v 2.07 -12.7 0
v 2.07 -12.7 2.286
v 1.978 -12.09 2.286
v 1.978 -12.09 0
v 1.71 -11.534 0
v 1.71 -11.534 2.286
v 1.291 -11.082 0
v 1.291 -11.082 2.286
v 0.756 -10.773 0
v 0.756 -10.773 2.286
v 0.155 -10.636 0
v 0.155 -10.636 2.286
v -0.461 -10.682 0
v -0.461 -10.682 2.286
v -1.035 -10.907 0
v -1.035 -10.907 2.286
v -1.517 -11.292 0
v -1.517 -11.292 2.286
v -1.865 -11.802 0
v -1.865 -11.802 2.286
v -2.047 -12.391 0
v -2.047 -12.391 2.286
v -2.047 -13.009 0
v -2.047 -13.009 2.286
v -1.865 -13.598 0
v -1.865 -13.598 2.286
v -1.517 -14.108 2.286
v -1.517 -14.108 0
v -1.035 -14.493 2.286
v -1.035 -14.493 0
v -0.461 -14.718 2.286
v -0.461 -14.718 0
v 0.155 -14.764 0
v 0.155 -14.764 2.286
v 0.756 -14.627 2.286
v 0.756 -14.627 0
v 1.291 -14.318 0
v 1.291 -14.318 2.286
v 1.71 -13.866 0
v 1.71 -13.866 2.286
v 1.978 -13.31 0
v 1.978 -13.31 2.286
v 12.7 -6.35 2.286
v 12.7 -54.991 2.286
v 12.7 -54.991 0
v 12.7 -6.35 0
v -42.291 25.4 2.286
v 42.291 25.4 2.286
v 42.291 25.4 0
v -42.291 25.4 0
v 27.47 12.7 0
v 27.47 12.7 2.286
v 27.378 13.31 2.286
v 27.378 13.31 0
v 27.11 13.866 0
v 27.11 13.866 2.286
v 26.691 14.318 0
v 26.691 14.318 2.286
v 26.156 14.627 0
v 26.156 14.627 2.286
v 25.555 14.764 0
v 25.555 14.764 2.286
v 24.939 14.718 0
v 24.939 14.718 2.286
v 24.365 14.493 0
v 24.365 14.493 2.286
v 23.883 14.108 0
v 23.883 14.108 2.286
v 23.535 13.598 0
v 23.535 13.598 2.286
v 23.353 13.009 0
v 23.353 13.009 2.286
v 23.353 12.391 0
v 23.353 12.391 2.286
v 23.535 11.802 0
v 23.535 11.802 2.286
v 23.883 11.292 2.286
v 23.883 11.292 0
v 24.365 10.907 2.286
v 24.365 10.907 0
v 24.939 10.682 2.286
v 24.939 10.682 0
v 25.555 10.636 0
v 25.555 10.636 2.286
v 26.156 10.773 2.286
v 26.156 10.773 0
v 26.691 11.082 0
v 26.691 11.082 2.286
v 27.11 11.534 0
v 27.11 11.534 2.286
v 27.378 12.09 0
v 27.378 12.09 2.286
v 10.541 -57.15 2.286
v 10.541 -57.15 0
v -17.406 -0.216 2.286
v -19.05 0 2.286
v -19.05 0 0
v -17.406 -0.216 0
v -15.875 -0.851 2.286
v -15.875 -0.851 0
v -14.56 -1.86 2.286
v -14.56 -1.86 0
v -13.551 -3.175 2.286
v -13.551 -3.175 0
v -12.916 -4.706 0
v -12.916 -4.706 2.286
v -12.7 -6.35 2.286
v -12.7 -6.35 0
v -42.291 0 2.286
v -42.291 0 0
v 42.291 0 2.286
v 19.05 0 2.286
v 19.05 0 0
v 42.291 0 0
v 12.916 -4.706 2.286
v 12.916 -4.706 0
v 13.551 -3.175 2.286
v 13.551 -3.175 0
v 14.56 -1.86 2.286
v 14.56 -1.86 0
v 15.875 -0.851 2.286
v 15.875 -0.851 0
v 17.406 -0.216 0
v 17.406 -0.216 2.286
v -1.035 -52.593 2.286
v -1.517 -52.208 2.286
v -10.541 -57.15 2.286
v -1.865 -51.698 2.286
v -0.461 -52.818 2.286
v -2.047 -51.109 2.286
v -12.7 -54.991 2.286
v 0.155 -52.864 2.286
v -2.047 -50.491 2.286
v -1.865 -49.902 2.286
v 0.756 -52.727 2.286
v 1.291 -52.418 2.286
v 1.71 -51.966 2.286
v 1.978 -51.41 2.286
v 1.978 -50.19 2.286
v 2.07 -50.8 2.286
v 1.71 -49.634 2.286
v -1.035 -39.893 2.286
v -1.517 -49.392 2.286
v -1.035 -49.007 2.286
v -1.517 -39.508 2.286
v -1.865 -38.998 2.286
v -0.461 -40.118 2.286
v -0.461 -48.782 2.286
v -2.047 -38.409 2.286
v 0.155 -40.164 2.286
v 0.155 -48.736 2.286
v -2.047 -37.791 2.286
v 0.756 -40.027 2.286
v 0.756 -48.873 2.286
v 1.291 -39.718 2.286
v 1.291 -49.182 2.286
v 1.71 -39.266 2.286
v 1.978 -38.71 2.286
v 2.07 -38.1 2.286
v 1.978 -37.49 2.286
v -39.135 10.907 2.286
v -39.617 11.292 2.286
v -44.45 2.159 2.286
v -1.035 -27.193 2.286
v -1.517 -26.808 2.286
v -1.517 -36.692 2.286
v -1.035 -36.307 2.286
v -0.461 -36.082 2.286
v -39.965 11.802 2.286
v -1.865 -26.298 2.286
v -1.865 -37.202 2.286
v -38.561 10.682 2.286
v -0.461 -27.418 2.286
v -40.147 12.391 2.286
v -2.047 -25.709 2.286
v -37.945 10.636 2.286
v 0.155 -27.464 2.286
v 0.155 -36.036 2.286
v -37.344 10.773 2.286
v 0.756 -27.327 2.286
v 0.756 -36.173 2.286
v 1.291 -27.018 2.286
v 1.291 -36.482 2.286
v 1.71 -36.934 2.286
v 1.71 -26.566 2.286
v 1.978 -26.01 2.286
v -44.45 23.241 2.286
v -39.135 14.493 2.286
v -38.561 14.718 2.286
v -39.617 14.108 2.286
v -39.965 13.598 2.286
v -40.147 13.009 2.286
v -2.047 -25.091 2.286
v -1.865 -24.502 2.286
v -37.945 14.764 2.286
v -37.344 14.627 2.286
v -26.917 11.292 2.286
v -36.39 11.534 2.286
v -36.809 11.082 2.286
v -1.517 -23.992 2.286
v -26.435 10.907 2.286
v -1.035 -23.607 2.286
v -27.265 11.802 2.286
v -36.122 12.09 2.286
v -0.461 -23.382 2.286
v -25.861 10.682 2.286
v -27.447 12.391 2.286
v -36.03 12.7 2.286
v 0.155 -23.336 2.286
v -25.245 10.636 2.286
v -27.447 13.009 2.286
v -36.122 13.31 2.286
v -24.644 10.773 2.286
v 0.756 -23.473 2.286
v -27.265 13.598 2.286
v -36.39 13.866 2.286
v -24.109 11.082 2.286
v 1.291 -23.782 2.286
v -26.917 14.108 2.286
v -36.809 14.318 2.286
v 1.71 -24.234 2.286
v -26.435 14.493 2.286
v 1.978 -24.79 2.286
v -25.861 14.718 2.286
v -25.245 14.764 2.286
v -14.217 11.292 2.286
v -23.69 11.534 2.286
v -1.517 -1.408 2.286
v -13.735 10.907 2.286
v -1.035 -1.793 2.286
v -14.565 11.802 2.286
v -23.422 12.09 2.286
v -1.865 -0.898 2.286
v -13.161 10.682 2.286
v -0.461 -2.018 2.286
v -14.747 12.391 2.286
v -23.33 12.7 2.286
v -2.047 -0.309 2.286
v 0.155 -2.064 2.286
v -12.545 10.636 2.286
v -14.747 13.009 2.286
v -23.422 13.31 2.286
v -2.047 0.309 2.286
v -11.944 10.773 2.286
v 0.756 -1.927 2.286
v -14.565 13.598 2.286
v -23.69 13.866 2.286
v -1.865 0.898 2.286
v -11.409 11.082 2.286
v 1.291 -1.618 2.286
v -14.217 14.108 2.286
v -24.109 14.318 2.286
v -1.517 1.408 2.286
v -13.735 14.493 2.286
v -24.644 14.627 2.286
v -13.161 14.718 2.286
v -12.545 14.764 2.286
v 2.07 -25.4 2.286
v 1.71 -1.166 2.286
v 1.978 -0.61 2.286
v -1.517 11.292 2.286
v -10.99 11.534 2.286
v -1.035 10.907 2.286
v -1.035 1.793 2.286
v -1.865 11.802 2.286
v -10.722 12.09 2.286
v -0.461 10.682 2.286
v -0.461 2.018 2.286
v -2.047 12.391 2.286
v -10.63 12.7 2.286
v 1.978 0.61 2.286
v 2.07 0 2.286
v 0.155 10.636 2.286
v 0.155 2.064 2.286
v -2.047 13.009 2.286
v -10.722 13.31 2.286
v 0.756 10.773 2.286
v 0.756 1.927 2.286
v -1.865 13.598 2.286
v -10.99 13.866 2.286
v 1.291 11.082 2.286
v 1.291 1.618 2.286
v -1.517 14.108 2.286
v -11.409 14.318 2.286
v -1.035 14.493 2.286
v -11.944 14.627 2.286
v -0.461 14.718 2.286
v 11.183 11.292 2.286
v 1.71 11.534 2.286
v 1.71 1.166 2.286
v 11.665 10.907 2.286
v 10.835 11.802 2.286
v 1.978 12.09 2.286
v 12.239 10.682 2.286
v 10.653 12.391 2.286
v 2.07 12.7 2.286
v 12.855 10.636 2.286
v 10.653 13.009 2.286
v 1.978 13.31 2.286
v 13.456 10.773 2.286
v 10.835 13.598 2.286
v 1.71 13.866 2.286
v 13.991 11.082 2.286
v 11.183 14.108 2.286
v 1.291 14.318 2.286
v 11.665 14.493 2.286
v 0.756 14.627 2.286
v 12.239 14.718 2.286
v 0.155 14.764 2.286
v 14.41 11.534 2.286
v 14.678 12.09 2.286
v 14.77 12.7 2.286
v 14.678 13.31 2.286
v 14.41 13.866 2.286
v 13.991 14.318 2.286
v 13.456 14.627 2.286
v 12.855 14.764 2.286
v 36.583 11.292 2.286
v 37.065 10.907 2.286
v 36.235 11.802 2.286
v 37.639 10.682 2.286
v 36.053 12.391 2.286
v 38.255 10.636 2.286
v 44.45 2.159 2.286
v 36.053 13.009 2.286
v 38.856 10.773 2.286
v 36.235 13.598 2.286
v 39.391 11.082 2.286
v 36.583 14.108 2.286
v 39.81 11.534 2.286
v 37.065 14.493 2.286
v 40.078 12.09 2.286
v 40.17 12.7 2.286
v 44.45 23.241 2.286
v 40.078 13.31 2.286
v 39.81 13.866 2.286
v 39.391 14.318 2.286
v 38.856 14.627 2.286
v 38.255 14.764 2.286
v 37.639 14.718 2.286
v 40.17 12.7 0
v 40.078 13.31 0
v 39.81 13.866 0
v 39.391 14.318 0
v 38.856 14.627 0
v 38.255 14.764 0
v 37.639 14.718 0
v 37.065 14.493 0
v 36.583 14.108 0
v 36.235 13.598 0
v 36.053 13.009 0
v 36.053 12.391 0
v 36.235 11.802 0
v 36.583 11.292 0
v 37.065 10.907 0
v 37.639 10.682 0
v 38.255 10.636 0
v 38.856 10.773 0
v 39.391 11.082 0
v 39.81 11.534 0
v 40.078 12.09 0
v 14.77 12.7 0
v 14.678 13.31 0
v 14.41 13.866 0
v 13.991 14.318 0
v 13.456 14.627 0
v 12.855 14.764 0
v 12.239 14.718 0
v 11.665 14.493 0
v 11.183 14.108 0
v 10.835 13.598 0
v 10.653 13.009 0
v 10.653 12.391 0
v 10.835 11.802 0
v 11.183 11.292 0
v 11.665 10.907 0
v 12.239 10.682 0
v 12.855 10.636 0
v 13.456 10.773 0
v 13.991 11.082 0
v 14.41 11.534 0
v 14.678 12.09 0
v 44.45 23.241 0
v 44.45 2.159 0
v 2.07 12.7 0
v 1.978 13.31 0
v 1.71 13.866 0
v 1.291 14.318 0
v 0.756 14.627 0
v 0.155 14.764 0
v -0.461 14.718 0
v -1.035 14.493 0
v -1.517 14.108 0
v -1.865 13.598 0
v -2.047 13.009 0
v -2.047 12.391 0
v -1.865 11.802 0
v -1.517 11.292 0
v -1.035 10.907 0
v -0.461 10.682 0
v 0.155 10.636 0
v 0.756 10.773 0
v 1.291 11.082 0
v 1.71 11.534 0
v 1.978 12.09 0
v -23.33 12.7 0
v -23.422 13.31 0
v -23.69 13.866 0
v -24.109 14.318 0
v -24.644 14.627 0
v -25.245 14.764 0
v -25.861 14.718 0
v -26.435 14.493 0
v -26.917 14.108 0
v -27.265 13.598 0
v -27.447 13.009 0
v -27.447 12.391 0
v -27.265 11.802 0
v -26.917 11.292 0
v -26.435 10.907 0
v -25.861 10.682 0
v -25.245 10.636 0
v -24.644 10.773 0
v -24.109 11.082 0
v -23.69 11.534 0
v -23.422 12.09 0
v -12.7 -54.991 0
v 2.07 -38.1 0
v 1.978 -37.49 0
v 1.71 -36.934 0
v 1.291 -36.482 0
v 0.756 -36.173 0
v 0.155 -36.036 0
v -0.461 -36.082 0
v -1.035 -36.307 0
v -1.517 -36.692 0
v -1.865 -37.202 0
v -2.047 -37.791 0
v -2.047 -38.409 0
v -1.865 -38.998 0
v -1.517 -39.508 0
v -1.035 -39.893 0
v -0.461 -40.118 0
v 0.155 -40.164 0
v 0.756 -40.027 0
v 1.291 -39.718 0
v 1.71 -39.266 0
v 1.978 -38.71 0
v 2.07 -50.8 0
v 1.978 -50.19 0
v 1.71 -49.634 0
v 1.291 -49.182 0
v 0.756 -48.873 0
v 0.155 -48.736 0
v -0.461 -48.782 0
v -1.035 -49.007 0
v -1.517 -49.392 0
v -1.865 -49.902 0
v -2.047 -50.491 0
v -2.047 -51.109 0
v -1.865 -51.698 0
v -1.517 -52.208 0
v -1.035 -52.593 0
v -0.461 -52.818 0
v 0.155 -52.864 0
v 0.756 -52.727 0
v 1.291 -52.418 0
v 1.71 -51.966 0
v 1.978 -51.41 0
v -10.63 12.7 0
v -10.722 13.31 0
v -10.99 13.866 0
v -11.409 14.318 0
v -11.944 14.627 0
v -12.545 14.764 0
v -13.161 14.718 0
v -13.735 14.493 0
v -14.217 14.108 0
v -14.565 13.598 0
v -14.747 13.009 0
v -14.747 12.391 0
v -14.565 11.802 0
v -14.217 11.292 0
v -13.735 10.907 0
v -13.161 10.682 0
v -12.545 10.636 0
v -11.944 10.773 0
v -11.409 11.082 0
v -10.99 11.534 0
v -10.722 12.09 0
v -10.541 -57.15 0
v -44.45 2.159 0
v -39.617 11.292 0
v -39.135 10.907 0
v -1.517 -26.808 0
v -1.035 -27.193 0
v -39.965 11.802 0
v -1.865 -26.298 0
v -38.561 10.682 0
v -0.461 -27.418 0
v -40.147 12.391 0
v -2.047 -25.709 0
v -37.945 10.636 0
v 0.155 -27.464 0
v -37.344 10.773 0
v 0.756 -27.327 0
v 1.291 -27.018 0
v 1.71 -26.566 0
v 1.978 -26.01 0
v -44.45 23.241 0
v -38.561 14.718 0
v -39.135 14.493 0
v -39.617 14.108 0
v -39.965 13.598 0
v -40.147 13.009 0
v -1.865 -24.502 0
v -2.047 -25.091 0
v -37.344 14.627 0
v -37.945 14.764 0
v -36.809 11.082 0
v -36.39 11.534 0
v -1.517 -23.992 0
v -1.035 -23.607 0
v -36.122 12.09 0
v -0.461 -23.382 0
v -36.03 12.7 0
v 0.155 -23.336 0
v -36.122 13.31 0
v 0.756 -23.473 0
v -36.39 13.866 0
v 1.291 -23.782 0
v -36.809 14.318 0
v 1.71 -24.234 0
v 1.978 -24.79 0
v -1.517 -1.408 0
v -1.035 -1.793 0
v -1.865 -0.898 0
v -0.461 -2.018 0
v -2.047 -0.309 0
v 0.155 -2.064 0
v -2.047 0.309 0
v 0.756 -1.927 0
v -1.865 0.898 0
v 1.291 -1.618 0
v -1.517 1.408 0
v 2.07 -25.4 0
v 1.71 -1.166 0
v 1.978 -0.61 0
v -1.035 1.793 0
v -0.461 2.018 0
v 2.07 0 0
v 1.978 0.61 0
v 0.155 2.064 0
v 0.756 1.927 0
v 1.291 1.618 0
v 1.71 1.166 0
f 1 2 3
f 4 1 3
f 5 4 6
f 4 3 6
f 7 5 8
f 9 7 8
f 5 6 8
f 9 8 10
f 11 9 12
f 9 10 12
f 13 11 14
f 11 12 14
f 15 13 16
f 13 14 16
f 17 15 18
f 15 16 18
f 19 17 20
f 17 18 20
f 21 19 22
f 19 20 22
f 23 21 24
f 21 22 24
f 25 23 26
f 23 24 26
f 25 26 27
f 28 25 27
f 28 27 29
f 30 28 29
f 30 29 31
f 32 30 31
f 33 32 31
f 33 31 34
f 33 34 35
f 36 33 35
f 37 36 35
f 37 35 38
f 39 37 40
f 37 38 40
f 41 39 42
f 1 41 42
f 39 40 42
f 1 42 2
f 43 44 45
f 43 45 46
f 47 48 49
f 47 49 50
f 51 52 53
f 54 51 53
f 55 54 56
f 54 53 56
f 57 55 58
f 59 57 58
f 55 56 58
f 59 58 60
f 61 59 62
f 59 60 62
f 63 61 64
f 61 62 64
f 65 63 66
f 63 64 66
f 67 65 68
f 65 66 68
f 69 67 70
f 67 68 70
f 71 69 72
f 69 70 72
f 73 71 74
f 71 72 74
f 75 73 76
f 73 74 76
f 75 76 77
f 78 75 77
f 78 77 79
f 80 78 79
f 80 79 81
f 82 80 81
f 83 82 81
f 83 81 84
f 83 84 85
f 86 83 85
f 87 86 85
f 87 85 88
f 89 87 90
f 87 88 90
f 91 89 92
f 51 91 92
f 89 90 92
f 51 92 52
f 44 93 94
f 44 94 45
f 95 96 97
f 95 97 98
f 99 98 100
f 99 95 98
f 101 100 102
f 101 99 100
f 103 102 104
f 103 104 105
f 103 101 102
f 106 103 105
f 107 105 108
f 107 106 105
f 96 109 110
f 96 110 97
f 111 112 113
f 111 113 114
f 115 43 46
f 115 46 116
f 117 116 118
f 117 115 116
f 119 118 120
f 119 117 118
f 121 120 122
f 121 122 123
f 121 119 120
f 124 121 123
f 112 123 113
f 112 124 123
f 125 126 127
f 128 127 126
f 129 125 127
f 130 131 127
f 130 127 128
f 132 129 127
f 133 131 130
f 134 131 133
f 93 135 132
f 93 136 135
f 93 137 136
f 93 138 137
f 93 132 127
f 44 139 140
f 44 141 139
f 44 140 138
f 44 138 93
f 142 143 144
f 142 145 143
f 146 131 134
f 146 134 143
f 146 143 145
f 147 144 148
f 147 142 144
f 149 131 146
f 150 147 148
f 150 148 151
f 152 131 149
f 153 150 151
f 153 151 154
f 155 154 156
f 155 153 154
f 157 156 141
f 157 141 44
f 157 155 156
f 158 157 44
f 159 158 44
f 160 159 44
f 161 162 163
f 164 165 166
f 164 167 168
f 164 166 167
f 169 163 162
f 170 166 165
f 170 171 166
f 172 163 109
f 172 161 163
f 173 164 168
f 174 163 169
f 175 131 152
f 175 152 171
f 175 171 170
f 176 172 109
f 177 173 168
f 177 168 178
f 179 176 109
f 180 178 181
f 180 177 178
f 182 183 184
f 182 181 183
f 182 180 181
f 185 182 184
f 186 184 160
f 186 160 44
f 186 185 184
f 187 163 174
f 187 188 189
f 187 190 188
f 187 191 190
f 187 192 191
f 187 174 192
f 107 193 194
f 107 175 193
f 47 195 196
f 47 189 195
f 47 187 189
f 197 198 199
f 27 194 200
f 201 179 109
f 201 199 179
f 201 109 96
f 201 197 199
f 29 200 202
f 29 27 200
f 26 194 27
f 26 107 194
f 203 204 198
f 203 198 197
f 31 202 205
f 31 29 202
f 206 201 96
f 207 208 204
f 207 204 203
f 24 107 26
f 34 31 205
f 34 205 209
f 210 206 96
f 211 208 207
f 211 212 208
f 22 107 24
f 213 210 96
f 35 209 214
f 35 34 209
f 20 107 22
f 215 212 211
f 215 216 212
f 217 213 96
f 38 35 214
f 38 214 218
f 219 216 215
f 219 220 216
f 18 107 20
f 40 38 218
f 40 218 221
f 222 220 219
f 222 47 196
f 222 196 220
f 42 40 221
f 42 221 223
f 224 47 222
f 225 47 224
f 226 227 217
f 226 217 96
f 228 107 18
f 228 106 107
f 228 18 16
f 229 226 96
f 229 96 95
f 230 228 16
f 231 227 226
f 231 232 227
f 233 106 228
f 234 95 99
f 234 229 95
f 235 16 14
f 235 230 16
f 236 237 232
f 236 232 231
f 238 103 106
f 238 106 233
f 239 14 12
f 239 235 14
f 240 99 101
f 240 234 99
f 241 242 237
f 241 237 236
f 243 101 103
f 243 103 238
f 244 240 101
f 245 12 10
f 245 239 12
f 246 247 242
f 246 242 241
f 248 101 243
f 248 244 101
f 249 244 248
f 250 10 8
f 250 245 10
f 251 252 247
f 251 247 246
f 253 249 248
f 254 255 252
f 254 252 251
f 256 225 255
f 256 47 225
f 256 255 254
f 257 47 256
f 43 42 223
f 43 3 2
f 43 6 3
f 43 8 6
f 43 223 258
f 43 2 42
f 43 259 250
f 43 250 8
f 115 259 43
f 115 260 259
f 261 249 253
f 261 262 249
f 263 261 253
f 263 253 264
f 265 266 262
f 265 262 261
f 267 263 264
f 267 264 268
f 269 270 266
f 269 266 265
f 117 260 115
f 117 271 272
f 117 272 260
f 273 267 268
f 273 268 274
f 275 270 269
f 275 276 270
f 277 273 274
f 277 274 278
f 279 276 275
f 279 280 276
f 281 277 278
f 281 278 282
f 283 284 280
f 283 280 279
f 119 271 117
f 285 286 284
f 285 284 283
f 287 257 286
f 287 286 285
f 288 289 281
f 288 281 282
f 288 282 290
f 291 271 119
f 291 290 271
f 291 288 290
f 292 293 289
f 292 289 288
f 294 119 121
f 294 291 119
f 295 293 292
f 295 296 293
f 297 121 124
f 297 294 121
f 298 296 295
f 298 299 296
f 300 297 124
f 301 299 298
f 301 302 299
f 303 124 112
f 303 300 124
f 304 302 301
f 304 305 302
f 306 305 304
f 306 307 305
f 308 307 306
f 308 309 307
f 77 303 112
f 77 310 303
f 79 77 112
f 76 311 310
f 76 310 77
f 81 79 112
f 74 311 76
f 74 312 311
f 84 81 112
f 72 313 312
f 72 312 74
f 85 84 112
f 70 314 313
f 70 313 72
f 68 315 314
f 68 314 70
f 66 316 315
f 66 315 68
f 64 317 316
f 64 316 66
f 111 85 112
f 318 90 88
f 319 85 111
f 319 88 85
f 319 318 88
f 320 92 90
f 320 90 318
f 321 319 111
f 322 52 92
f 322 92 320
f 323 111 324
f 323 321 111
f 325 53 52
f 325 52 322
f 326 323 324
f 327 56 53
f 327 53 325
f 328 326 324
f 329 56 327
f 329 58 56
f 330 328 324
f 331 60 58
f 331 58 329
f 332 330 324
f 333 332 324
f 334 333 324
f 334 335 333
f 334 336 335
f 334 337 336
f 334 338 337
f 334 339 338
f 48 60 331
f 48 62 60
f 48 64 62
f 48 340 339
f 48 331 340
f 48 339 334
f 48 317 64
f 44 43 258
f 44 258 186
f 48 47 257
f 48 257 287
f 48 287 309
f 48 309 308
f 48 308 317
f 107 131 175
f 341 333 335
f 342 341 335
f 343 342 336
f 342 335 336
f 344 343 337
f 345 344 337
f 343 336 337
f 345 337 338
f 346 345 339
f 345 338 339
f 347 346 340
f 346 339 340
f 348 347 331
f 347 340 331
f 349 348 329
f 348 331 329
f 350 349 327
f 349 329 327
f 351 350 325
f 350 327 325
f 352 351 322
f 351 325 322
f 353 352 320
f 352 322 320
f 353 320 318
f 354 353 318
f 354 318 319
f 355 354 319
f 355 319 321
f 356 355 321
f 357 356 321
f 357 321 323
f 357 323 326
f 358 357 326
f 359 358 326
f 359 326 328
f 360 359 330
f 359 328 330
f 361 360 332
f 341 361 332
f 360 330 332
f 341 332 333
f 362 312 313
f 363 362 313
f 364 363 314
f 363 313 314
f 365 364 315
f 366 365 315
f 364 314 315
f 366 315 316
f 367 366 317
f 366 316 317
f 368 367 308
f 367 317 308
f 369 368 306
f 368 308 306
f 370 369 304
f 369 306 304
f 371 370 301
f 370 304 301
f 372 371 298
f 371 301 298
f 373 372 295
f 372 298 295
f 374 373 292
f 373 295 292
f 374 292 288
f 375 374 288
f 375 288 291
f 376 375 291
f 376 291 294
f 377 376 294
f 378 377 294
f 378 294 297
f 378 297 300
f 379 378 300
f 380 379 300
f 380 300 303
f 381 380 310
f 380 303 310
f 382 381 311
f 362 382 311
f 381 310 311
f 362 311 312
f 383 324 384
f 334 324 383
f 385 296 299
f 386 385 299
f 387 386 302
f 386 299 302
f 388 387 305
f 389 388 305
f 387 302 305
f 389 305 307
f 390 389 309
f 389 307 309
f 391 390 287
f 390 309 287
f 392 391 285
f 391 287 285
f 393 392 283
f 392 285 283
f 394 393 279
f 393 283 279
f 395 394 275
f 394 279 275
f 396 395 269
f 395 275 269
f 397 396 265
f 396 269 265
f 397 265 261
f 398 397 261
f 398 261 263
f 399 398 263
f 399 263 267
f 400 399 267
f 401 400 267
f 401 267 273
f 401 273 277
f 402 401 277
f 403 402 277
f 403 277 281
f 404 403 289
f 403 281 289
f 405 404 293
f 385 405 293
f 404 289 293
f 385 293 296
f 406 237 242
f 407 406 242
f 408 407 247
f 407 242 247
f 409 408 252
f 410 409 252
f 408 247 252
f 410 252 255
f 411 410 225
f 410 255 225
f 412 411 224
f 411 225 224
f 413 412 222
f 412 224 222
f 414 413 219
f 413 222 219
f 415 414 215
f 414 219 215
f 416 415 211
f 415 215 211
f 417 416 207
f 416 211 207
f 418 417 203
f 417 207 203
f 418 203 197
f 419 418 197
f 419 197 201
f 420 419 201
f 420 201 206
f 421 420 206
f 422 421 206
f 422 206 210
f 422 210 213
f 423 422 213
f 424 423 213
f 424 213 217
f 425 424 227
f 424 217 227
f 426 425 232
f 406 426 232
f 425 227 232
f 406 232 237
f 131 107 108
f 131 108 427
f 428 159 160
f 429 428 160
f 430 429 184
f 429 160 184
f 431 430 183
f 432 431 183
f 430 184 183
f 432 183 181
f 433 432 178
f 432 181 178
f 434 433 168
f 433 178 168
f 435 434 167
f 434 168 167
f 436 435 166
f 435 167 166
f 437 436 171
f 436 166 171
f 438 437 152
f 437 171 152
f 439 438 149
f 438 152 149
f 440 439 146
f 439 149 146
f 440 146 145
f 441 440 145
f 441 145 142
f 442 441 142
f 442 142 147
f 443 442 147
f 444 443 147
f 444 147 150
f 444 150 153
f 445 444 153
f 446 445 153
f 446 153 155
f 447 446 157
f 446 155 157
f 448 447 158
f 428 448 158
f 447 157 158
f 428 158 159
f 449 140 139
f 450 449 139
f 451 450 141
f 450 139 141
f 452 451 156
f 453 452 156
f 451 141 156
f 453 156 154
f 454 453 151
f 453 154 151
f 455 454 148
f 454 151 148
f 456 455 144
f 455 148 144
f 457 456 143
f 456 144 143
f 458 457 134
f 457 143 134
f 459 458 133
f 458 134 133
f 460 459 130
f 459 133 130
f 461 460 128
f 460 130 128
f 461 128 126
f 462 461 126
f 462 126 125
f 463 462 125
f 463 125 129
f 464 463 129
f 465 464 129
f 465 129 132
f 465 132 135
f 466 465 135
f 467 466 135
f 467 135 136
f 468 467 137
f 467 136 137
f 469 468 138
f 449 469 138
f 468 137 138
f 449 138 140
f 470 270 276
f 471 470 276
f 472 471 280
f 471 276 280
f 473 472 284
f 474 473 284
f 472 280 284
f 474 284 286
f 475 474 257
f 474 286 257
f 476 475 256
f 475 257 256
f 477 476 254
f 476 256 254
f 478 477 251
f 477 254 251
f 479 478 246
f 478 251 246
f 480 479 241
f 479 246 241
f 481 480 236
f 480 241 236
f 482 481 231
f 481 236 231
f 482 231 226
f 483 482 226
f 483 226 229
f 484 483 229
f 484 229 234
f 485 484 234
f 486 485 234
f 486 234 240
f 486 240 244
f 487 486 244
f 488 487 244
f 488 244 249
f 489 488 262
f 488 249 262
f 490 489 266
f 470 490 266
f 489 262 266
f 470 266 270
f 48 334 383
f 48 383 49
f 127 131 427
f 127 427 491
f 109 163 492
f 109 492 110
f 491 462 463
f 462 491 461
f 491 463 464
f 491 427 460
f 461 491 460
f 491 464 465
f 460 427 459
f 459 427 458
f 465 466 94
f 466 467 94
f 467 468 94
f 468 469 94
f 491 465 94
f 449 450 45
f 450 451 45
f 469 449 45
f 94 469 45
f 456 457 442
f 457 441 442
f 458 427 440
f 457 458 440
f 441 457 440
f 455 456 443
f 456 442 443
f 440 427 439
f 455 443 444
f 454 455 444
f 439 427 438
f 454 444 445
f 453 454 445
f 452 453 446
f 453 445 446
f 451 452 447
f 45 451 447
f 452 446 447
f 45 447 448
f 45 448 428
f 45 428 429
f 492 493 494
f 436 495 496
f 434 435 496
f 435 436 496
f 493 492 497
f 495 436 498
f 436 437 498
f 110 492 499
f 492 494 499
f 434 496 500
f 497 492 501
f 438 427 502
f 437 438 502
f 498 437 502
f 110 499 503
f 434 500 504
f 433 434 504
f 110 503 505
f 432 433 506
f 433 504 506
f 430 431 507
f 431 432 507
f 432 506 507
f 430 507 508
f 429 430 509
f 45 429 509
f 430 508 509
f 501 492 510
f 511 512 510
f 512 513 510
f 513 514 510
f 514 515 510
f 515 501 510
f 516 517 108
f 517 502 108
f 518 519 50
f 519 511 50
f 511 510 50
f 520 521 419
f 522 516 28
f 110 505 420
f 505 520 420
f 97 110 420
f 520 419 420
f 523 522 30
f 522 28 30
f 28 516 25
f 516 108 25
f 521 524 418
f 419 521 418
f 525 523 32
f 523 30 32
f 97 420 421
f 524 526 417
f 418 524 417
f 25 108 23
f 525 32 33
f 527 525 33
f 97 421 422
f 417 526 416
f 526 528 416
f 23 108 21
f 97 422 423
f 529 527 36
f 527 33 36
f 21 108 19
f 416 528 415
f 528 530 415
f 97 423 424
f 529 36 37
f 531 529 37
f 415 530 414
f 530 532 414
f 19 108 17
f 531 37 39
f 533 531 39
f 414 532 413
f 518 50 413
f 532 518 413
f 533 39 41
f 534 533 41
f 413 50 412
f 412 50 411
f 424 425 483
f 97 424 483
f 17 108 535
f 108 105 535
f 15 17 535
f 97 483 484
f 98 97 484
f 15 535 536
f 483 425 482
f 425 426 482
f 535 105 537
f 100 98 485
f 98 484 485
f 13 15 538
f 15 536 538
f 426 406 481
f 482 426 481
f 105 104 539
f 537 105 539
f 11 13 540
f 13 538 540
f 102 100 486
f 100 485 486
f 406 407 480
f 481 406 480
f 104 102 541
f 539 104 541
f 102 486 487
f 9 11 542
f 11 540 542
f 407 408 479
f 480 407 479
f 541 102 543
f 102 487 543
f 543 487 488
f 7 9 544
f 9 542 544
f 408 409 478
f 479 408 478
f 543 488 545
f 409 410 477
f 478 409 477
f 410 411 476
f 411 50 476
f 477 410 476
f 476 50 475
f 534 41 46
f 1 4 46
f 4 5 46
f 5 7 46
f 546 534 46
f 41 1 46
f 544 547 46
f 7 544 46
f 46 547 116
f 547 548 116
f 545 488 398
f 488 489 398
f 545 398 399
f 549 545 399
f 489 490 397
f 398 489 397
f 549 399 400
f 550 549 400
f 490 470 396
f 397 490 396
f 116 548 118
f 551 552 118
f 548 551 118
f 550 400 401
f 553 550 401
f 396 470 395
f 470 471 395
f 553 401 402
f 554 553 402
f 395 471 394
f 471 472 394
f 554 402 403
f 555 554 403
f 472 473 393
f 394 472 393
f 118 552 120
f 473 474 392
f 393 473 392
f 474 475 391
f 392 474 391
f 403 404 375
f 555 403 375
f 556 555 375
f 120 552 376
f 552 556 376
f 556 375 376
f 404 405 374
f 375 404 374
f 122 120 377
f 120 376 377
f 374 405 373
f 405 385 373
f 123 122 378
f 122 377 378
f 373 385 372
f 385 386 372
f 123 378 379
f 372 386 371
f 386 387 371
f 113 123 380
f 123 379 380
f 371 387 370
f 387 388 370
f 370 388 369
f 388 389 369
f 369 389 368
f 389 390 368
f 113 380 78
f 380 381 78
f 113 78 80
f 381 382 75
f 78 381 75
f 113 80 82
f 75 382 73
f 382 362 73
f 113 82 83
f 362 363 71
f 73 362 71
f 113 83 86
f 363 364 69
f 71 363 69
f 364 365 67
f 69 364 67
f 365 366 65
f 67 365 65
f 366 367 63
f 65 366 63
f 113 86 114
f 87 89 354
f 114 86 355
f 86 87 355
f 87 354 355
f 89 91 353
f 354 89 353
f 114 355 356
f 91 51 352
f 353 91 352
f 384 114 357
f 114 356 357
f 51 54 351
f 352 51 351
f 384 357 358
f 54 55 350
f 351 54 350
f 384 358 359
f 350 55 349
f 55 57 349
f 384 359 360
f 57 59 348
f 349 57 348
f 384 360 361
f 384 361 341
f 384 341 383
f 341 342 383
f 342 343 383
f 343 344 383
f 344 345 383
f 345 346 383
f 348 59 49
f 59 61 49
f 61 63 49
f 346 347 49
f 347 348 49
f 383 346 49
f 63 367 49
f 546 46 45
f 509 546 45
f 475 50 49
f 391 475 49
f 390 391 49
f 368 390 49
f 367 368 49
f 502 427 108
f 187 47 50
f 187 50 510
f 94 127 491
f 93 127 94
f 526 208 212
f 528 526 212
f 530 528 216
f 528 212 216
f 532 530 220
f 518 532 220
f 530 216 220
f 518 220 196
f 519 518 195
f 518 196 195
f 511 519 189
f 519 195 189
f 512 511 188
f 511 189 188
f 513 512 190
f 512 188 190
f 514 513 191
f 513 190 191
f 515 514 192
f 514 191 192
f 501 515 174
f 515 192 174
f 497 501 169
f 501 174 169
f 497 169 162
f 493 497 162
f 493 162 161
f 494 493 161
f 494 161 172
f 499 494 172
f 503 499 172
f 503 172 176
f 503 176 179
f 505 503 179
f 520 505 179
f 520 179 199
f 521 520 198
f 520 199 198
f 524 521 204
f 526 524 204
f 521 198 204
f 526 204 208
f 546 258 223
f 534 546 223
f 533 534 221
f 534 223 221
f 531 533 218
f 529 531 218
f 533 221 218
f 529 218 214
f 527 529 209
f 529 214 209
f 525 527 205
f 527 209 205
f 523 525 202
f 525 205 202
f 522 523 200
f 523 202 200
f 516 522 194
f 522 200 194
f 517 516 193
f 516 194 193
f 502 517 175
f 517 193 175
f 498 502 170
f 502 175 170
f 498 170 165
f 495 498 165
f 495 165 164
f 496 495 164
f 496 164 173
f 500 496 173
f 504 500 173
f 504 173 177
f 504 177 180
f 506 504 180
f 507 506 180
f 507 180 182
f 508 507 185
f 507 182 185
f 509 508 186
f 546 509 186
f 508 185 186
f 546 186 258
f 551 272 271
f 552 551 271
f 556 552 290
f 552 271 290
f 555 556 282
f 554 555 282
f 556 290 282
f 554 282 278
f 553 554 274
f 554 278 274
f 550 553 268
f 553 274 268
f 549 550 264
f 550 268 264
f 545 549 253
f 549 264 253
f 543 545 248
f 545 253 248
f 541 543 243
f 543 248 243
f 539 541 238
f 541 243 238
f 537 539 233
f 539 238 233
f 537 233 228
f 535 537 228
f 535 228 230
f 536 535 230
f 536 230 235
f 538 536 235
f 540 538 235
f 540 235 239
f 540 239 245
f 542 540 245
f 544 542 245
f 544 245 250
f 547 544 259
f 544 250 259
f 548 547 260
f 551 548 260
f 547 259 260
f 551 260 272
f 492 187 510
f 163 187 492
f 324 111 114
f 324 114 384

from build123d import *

# Parameters (mm, degrees)
SKETCH1_R           = 2.0701
BOSS_EXTRUDE1_DEPTH = 2.286


with BuildPart() as part:
    # Sketch1 → Boss-Extrude1 (new body)
    with BuildSketch(Plane.XY.offset(2.286)):
        with BuildLine():
            Line((12.7, -54.991), (12.7, -6.35))
            ThreePointArc((12.7, -6.35), (14.559871939, -1.859871939), (19.05, 0))
            Line((19.05, 0), (42.291, 0))
            Line((42.291, 0), (44.45, 2.159))
            Line((44.45, 2.159), (44.45, 23.241))
            Line((44.45, 23.241), (42.291, 25.4))
            Line((42.291, 25.4), (-42.291, 25.4))
            Line((-42.291, 25.4), (-44.45, 23.241))
            Line((-44.45, 23.241), (-44.45, 2.159))
            Line((-44.45, 2.159), (-42.291, 0))
            Line((-42.291, 0), (-19.05, 0))
            ThreePointArc((-19.05, 0), (-14.559871939, -1.859871939), (-12.7, -6.35))
            Line((-12.7, -6.35), (-12.7, -54.991))
            Line((-12.7, -54.991), (-10.541, -57.15))
            Line((-10.541, -57.15), (10.541, -57.15))
            Line((10.541, -57.15), (12.7, -54.991))
        make_face()
        with Locations((0, -38.1)):
            Circle(SKETCH1_R, mode=Mode.SUBTRACT)
        with Locations((0, -12.7)):
            Circle(SKETCH1_R, mode=Mode.SUBTRACT)
        with Locations((38.1, 12.7)):
            Circle(SKETCH1_R, mode=Mode.SUBTRACT)
        with Locations((12.7, 12.7)):
            Circle(SKETCH1_R, mode=Mode.SUBTRACT)
        with Locations((-12.7, 12.7)):
            Circle(SKETCH1_R, mode=Mode.SUBTRACT)
        with Locations((-38.1, 12.7)):
            Circle(SKETCH1_R, mode=Mode.SUBTRACT)
        with Locations((-25.4, 12.7)):
            Circle(SKETCH1_R, mode=Mode.SUBTRACT)
        with Locations((0, 12.7)):
            Circle(SKETCH1_R, mode=Mode.SUBTRACT)
        with Locations((25.4, 12.7)):
            Circle(SKETCH1_R, mode=Mode.SUBTRACT)
        Circle(SKETCH1_R, mode=Mode.SUBTRACT)
        with Locations((0, -25.4)):
            Circle(SKETCH1_R, mode=Mode.SUBTRACT)
        with Locations((0, -50.8)):
            Circle(SKETCH1_R, mode=Mode.SUBTRACT)
    extrude(amount=-BOSS_EXTRUDE1_DEPTH)


solid = part.part
